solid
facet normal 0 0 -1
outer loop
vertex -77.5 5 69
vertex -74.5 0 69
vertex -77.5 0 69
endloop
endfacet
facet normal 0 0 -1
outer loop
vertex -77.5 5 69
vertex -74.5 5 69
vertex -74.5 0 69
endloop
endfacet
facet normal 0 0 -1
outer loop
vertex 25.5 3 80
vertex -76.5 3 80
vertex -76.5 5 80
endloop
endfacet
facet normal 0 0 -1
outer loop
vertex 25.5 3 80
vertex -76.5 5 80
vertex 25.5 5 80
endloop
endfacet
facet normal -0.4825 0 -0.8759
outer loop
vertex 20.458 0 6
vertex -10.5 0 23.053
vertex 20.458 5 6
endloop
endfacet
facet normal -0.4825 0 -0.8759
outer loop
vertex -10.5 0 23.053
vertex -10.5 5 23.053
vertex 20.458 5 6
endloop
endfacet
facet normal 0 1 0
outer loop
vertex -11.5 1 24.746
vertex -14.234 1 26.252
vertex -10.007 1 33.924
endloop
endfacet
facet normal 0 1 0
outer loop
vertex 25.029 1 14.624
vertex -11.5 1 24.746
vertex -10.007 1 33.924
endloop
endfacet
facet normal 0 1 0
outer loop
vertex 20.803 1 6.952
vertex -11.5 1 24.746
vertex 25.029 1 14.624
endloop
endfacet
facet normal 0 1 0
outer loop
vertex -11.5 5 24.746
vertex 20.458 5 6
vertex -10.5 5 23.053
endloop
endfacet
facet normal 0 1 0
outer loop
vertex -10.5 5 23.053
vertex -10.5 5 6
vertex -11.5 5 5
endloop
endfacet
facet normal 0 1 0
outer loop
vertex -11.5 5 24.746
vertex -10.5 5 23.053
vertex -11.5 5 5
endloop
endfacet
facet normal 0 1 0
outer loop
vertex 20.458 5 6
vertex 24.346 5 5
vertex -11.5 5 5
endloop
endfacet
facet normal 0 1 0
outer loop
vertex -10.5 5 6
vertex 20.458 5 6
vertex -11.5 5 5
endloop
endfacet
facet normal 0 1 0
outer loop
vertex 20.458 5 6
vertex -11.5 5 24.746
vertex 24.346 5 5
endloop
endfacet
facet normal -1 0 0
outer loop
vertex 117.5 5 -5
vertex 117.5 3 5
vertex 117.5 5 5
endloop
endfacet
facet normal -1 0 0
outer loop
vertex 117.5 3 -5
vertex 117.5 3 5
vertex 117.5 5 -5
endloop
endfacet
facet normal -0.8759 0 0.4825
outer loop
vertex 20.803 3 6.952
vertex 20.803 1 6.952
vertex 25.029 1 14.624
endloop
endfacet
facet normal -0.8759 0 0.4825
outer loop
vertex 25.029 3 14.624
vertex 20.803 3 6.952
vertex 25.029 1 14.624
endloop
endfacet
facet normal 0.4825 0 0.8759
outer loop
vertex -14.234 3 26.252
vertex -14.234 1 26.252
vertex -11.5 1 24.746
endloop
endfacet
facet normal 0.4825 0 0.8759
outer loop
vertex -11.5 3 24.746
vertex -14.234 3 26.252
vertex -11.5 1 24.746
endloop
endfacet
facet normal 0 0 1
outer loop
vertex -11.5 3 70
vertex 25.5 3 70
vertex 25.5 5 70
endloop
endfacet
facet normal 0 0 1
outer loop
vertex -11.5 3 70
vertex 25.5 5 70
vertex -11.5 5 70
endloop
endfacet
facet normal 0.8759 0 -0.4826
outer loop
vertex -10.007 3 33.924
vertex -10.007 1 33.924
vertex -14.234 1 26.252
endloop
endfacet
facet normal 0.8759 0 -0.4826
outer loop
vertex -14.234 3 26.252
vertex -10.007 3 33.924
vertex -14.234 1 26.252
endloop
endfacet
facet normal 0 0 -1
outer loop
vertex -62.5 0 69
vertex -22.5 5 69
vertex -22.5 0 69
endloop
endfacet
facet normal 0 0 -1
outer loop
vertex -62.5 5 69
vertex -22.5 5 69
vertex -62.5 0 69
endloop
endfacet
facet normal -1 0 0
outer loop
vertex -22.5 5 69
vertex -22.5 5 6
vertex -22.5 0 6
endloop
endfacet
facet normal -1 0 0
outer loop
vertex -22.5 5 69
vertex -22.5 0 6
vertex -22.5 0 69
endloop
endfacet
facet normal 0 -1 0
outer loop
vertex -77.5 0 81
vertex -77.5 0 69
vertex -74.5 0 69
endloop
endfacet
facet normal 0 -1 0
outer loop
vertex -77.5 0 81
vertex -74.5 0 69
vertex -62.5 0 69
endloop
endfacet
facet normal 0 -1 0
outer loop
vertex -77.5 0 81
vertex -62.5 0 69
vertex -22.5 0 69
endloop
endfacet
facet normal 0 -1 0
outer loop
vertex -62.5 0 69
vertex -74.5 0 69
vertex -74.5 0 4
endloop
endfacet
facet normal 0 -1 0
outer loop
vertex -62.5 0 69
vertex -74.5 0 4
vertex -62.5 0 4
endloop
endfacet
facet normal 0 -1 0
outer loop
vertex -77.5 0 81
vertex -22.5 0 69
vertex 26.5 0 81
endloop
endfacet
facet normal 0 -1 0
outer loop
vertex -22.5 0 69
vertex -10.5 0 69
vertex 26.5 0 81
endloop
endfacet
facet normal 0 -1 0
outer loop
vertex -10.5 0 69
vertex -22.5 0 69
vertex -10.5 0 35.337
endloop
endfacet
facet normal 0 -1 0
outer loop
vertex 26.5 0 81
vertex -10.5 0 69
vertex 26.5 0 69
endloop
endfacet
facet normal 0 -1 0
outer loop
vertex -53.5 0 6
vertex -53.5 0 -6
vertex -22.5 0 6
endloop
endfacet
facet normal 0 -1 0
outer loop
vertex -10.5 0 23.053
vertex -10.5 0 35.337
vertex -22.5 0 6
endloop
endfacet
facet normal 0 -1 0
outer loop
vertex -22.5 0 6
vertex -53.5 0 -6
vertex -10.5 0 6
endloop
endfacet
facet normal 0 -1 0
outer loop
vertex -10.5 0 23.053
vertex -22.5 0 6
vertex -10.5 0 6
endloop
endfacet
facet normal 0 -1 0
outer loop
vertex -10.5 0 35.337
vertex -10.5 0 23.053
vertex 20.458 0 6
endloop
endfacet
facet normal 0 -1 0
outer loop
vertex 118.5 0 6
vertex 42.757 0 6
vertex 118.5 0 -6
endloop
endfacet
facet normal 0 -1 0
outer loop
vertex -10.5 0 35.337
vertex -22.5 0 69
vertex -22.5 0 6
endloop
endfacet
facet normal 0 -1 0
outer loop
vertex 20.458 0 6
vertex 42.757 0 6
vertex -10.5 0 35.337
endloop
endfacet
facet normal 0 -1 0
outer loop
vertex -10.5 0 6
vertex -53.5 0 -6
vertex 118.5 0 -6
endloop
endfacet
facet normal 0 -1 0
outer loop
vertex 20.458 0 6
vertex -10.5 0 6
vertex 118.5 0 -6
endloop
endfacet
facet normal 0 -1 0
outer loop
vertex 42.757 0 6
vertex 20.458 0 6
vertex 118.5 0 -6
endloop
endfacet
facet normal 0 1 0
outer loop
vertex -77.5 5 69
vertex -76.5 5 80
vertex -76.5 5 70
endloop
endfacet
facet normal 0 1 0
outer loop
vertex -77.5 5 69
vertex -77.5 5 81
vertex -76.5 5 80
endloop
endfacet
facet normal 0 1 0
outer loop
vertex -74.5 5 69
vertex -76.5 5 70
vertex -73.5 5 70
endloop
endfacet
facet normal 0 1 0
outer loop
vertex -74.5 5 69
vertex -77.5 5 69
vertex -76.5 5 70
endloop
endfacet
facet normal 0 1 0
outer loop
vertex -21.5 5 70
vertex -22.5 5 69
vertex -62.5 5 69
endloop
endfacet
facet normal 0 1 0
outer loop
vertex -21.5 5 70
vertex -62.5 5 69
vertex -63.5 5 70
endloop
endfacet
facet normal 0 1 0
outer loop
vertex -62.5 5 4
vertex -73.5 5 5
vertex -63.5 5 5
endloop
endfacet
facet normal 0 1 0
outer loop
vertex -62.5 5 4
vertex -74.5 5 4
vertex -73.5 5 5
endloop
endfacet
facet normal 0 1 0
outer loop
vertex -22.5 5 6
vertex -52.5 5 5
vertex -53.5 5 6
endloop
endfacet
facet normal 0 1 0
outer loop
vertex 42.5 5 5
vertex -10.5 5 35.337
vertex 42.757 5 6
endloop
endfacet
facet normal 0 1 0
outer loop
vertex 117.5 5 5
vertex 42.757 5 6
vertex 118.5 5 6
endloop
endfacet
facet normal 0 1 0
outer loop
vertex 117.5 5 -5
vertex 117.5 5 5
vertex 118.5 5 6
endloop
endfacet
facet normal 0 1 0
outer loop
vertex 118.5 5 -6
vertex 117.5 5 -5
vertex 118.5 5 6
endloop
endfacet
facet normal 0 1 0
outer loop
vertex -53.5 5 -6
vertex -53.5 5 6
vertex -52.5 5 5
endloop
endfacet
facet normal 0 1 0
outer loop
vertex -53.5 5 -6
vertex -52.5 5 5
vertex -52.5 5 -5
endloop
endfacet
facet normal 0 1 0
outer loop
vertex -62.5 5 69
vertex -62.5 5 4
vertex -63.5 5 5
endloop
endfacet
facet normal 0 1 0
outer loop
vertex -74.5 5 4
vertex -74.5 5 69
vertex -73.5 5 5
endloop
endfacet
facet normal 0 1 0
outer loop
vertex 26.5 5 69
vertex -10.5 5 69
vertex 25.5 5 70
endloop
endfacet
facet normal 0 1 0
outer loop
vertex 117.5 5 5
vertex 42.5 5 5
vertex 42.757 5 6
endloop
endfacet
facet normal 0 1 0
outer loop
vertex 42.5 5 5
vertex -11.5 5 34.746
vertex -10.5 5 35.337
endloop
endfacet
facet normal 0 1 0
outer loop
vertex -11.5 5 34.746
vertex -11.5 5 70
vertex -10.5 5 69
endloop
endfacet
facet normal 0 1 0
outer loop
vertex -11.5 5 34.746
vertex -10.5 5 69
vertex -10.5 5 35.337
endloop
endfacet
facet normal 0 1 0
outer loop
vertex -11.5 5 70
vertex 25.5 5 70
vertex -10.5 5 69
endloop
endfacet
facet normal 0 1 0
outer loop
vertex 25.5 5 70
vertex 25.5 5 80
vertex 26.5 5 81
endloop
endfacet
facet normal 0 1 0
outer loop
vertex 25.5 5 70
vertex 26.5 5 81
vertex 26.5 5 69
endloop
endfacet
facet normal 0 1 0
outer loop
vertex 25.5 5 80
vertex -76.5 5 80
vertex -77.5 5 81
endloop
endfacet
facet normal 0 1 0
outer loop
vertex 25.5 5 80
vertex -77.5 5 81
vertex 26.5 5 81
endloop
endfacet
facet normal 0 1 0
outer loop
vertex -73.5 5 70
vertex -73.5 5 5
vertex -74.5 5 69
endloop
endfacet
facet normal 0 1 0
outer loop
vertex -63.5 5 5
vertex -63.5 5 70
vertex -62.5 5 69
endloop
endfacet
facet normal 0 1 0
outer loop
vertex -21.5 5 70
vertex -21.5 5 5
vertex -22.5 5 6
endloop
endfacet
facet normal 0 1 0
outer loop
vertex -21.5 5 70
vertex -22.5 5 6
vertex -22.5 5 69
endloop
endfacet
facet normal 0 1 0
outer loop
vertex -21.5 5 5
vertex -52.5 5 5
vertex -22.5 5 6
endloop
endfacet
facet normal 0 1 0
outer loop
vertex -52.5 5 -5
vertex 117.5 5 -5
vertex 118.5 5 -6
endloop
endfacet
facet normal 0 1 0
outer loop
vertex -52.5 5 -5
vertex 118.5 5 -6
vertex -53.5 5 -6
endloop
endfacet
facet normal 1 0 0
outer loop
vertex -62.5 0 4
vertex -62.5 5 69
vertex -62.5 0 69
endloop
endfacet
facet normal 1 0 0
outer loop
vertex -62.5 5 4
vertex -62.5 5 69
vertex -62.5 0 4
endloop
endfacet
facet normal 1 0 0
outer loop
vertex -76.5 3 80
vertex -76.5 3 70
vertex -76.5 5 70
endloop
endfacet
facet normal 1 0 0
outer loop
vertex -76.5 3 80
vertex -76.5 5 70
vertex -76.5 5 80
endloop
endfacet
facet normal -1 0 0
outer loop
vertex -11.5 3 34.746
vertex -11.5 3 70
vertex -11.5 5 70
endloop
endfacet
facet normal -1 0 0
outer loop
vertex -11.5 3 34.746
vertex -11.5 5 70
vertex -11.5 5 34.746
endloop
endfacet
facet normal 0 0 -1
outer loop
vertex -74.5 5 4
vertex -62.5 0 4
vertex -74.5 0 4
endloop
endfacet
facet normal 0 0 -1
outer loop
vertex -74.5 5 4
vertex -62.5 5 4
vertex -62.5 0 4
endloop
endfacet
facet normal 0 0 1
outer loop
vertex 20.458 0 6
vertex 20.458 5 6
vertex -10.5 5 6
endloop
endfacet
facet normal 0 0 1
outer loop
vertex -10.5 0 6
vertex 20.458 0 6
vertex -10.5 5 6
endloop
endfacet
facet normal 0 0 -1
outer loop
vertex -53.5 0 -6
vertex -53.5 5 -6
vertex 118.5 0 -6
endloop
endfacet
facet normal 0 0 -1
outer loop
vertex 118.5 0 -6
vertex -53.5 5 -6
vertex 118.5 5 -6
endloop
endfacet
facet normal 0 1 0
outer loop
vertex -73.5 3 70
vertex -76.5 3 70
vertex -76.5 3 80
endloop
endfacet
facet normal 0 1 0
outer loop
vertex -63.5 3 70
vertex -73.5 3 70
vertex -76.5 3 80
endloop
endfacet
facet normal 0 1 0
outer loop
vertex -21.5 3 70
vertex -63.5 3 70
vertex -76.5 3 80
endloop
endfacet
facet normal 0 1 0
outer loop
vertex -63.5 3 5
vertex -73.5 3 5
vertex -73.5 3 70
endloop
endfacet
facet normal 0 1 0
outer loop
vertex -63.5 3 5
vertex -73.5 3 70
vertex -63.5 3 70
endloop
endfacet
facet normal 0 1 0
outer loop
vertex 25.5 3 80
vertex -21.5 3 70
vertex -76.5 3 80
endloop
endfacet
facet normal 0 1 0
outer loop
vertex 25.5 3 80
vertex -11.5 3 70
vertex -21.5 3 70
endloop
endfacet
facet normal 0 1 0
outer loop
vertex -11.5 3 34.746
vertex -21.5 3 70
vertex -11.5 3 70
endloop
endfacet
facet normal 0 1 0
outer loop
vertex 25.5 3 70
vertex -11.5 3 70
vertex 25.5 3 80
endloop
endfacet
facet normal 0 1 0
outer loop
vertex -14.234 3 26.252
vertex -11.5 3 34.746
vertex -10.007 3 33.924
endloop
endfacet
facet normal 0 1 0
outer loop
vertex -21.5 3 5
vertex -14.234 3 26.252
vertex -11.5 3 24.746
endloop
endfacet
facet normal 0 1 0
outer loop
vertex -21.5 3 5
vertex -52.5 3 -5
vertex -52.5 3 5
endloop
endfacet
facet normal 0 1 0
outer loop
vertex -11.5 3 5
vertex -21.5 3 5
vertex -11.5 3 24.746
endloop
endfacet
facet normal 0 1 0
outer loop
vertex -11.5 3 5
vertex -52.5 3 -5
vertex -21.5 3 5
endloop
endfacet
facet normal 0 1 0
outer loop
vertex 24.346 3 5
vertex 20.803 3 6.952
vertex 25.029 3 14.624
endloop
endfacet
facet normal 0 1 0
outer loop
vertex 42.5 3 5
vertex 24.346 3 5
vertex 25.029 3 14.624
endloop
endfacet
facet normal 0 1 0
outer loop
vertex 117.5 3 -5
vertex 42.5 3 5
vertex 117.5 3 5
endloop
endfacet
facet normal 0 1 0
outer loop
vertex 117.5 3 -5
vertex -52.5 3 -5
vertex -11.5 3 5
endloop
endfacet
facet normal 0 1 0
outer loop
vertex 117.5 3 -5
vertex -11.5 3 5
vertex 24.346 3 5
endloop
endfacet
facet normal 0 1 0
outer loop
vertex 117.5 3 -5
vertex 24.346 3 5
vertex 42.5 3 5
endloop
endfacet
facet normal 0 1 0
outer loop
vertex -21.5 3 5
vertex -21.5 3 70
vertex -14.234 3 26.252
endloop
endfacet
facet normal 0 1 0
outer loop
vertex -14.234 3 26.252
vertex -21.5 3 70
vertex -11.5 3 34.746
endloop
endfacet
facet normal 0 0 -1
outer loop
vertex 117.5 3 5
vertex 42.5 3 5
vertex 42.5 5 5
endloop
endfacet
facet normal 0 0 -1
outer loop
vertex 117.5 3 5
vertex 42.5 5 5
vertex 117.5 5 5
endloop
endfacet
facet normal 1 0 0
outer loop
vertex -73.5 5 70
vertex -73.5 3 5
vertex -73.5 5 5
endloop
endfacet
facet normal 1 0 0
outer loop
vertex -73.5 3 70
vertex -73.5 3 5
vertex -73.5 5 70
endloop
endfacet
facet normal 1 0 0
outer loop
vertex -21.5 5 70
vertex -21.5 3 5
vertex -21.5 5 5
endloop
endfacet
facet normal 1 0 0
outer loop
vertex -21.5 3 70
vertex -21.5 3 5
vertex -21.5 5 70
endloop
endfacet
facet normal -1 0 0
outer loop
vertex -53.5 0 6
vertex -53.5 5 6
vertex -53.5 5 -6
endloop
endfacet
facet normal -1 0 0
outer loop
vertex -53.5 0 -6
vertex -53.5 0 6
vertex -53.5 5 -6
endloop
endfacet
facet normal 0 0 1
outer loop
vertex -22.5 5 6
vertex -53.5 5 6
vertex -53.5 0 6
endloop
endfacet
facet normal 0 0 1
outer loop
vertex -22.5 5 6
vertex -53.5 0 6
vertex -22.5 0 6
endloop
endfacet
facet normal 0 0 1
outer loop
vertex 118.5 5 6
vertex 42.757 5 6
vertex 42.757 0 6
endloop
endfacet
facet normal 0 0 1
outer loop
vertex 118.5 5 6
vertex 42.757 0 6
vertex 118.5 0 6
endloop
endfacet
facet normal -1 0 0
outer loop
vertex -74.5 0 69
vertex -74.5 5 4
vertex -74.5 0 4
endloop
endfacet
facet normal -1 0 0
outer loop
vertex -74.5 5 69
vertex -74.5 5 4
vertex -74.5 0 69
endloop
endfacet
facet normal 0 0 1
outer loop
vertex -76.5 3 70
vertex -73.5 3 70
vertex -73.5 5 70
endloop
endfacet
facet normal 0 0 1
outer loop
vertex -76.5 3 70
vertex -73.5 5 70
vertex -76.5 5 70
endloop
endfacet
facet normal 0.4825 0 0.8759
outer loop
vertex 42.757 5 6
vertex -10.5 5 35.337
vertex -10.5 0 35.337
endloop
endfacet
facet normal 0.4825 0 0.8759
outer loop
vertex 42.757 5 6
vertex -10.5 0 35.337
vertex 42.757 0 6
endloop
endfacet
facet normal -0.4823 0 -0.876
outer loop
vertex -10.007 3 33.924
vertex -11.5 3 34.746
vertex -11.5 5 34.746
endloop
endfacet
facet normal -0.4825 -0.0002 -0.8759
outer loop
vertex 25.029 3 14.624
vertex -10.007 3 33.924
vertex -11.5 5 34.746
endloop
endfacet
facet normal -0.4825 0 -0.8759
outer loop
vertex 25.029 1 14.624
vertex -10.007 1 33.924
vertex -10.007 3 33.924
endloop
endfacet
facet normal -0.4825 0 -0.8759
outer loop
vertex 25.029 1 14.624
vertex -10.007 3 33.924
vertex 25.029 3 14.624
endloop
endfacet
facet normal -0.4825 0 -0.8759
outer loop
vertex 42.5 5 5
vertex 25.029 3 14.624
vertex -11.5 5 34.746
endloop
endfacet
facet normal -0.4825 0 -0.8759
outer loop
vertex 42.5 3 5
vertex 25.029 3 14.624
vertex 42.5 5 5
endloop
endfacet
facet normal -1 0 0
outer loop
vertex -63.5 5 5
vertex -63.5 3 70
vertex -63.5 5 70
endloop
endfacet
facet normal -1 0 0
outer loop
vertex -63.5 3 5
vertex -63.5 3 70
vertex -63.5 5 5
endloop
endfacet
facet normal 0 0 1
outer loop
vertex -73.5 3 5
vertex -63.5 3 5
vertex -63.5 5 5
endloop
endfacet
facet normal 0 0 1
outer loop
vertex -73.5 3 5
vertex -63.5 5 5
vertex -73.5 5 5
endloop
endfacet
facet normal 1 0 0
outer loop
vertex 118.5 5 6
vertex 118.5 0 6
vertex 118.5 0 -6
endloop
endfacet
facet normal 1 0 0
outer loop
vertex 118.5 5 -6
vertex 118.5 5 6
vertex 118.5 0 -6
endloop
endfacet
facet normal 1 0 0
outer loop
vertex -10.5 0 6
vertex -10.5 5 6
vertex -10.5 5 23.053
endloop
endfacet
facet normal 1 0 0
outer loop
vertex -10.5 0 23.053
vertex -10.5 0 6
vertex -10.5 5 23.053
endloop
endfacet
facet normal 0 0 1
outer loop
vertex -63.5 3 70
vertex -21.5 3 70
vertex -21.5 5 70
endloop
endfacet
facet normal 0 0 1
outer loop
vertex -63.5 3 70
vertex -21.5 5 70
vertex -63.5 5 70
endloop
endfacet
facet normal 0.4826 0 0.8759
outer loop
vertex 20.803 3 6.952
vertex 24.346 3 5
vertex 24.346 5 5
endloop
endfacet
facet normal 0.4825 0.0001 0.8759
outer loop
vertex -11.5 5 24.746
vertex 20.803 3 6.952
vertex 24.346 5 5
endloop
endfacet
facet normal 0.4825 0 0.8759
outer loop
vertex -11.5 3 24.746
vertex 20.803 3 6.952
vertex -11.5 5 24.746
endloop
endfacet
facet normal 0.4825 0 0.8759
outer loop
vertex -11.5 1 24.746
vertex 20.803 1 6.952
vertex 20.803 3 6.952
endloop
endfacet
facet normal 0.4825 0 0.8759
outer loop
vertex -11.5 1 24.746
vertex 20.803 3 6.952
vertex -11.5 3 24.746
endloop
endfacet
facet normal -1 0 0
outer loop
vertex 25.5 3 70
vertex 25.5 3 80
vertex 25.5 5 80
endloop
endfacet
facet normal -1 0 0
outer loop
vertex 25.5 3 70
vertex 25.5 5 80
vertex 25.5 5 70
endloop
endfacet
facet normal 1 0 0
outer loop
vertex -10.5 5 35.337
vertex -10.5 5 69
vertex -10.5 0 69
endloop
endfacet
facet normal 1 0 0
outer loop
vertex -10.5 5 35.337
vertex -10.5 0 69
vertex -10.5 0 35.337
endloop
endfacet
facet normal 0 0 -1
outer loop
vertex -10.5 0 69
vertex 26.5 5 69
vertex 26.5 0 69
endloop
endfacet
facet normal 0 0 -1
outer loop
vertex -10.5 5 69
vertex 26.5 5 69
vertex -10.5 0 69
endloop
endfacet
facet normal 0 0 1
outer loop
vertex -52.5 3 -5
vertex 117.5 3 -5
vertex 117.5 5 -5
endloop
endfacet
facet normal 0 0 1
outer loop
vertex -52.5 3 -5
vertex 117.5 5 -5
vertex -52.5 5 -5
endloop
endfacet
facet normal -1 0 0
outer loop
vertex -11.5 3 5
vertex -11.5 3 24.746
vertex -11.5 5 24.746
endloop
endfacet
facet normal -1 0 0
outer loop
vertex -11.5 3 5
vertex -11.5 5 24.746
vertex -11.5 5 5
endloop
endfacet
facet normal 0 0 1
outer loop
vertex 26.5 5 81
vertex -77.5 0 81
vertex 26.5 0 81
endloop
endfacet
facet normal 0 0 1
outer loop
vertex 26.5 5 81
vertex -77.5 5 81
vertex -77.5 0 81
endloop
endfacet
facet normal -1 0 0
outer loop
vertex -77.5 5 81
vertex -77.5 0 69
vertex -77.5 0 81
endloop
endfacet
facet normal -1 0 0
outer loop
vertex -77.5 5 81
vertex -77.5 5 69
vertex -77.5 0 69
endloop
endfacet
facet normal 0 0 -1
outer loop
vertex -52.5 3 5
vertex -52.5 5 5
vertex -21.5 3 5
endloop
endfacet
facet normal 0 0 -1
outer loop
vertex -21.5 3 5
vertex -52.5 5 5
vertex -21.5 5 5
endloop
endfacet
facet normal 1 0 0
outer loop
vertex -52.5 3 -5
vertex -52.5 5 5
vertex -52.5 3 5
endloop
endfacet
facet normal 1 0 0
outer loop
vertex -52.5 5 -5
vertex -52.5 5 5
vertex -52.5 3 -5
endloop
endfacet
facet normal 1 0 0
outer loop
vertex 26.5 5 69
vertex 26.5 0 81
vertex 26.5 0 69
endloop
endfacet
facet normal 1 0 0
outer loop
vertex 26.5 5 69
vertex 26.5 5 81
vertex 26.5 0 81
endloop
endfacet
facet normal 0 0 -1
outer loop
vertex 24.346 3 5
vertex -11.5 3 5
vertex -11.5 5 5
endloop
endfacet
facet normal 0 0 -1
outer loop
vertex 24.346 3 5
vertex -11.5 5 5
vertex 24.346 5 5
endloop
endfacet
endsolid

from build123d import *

# Parameters (mm, degrees)
SKETCH_3_W           = 10
SKETCH_3_H           = 65
SKETCH_3_W_2         = 85
SKETCH_3_H_2         = 10
EXTRUDE_2_DEPTH      = 1
EXTRUDE_3_DEPTH      = 4
EXTRUDE_3_DEPTH_BACK = 1
EXTRUDE_4_DEPTH      = 2
SKETCH_7_W           = 10
SKETCH_7_H           = 12
CUT_EXTRUDE_1_DEPTH  = 5
SKETCH_8_W           = 1
SKETCH_8_H           = 10
EXTRUDE_5_DEPTH      = 2
SKETCH_9_W           = 10
SKETCH_9_H           = 12
EXTRUDE_7_DEPTH      = 5
SKETCH_10_W          = 10
SKETCH_10_H          = 10
CUT_EXTRUDE_2_DEPTH  = 2


with BuildPart() as part:
    # 草图3 → 凸台-拉伸2 (new body)
    with BuildSketch(Plane(origin=(0, 0, 0), x_dir=(1, 0, 0), z_dir=(0, 1, 0))):
        with Locations((-68.5, -37.5)):
            Rectangle(SKETCH_3_W, SKETCH_3_H)
        Polygon((25.5, -70), (-11.5, -70), (-21.5, -70), (-63.5, -70), (-73.5, -70), (-76.5, -70), (-76.5, -80), (25.5, -80), align=None)
        Polygon((-11.5, -70), (-11.5, -34.745762712), (-16.5, -37.5), (-16.5, -27.5), (-11.5, -24.745762712), (-11.5, -5), (-21.5, -5), (-21.5, -70), align=None)
        Polygon((24.346153846, -5), (42.5, 5), (-42.5, 5), (-42.5, -5), (-21.5, -5), (-11.5, -5), align=None)
        with Locations((85, 0)):
            Rectangle(SKETCH_3_W_2, SKETCH_3_H_2)
        Polygon((24.346153846, -5), (42.5, -5), (42.5, 5), align=None)
        Polygon((-11.5, -34.745762712), (42.5, -5), (24.346153846, -5), (-11.5, -24.745762712), align=None)
        Polygon((-16.5, -37.5), (-11.5, -34.745762712), (-11.5, -24.745762712), (-16.5, -27.5), align=None)
    extrude(amount=EXTRUDE_2_DEPTH)

    # 草图4 → 凸台-拉伸3 (add, two sides)
    with BuildSketch(Plane(origin=(0, 1, 0), x_dir=(1, 0, 0), z_dir=(0, 1, 0))) as extrude_3_sk:
        Polygon((26.5, -69), (-10.5, -69), (-10.5, -35.336595122), (42.757203453, -6), (128.5, -6), (128.5, 6), (-43.5, 6), (-43.5, -6), (-22.5, -6), (-22.5, -69), (-62.5, -69), (-62.5, -4), (-74.5, -4), (-74.5, -69), (-77.5, -69), (-77.5, -81), (26.5, -81), align=None)
        Polygon((-11.5, -34.745762712), (42.5, -5), (127.5, -5), (127.5, 5), (-42.5, 5), (-42.5, -5), (-21.5, -5), (-21.5, -70), (-63.5, -70), (-63.5, -5), (-73.5, -5), (-73.5, -70), (-76.5, -70), (-76.5, -80), (25.5, -80), (25.5, -70), (-11.5, -70), align=None, mode=Mode.SUBTRACT)
        Polygon((-11.5, -5), (24.346153846, -5), (-11.5, -24.745762712), align=None)
        Polygon((-10.5, -23.053235386), (20.458181162, -6), (-10.5, -6), align=None, mode=Mode.SUBTRACT)
    extrude(amount=EXTRUDE_3_DEPTH)
    extrude(extrude_3_sk.sketch, amount=-EXTRUDE_3_DEPTH_BACK)

    # 草图5 → 凸台-拉伸4 (add)
    with BuildSketch(Plane(origin=(0, 1, 0), x_dir=(1, 0, 0), z_dir=(0, 1, 0))):
        Polygon((-10.007424518, -33.923581302), (-14.233552679, -26.251533255), (-11.5, -24.745762712), (-11.5, -5), (24.346153846, -5), (20.802538534, -6.951991486), (25.028666695, -14.624039532), (42.5, -5), (127.5, -5), (127.5, 5), (-42.5, 5), (-42.5, -5), (-21.5, -5), (-21.5, -70), (-63.5, -70), (-63.5, -5), (-73.5, -5), (-73.5, -70), (-76.5, -70), (-76.5, -80), (25.5, -80), (25.5, -70), (-11.5, -70), (-11.5, -34.745762712), align=None)
    extrude(amount=EXTRUDE_4_DEPTH)

    # 草图7 → 切除-拉伸1 (cut)
    with BuildSketch(Plane(origin=(0, 5, 0), x_dir=(1, 0, 0), z_dir=(0, 1, 0))):
        with Locations((123.5, 0)):
            Rectangle(SKETCH_7_W, SKETCH_7_H)
    extrude(amount=-CUT_EXTRUDE_1_DEPTH, mode=Mode.SUBTRACT)

    # 草图8 → 凸台-拉伸5 (add)
    with BuildSketch(Plane(origin=(0, 3, 0), x_dir=(1, 0, 0), z_dir=(0, 1, 0))):
        with Locations((118, 0)):
            Rectangle(SKETCH_8_W, SKETCH_8_H)
    extrude(amount=EXTRUDE_5_DEPTH)

    # 草图9 → 凸台-拉伸7 (add)
    with BuildSketch(Plane(origin=(0, 5, 0), x_dir=(1, 0, 0), z_dir=(0, 1, 0))):
        with Locations((-48.5, 0)):
            Rectangle(SKETCH_9_W, SKETCH_9_H)
    extrude(amount=-EXTRUDE_7_DEPTH)

    # 草图10 → 切除-拉伸2 (cut)
    with BuildSketch(Plane(origin=(0, 5, 0), x_dir=(1, 0, 0), z_dir=(0, 1, 0))):
        with Locations((-47.5, 0)):
            Rectangle(SKETCH_10_W, SKETCH_10_H)
    extrude(amount=-CUT_EXTRUDE_2_DEPTH, mode=Mode.SUBTRACT)


solid = part.part
